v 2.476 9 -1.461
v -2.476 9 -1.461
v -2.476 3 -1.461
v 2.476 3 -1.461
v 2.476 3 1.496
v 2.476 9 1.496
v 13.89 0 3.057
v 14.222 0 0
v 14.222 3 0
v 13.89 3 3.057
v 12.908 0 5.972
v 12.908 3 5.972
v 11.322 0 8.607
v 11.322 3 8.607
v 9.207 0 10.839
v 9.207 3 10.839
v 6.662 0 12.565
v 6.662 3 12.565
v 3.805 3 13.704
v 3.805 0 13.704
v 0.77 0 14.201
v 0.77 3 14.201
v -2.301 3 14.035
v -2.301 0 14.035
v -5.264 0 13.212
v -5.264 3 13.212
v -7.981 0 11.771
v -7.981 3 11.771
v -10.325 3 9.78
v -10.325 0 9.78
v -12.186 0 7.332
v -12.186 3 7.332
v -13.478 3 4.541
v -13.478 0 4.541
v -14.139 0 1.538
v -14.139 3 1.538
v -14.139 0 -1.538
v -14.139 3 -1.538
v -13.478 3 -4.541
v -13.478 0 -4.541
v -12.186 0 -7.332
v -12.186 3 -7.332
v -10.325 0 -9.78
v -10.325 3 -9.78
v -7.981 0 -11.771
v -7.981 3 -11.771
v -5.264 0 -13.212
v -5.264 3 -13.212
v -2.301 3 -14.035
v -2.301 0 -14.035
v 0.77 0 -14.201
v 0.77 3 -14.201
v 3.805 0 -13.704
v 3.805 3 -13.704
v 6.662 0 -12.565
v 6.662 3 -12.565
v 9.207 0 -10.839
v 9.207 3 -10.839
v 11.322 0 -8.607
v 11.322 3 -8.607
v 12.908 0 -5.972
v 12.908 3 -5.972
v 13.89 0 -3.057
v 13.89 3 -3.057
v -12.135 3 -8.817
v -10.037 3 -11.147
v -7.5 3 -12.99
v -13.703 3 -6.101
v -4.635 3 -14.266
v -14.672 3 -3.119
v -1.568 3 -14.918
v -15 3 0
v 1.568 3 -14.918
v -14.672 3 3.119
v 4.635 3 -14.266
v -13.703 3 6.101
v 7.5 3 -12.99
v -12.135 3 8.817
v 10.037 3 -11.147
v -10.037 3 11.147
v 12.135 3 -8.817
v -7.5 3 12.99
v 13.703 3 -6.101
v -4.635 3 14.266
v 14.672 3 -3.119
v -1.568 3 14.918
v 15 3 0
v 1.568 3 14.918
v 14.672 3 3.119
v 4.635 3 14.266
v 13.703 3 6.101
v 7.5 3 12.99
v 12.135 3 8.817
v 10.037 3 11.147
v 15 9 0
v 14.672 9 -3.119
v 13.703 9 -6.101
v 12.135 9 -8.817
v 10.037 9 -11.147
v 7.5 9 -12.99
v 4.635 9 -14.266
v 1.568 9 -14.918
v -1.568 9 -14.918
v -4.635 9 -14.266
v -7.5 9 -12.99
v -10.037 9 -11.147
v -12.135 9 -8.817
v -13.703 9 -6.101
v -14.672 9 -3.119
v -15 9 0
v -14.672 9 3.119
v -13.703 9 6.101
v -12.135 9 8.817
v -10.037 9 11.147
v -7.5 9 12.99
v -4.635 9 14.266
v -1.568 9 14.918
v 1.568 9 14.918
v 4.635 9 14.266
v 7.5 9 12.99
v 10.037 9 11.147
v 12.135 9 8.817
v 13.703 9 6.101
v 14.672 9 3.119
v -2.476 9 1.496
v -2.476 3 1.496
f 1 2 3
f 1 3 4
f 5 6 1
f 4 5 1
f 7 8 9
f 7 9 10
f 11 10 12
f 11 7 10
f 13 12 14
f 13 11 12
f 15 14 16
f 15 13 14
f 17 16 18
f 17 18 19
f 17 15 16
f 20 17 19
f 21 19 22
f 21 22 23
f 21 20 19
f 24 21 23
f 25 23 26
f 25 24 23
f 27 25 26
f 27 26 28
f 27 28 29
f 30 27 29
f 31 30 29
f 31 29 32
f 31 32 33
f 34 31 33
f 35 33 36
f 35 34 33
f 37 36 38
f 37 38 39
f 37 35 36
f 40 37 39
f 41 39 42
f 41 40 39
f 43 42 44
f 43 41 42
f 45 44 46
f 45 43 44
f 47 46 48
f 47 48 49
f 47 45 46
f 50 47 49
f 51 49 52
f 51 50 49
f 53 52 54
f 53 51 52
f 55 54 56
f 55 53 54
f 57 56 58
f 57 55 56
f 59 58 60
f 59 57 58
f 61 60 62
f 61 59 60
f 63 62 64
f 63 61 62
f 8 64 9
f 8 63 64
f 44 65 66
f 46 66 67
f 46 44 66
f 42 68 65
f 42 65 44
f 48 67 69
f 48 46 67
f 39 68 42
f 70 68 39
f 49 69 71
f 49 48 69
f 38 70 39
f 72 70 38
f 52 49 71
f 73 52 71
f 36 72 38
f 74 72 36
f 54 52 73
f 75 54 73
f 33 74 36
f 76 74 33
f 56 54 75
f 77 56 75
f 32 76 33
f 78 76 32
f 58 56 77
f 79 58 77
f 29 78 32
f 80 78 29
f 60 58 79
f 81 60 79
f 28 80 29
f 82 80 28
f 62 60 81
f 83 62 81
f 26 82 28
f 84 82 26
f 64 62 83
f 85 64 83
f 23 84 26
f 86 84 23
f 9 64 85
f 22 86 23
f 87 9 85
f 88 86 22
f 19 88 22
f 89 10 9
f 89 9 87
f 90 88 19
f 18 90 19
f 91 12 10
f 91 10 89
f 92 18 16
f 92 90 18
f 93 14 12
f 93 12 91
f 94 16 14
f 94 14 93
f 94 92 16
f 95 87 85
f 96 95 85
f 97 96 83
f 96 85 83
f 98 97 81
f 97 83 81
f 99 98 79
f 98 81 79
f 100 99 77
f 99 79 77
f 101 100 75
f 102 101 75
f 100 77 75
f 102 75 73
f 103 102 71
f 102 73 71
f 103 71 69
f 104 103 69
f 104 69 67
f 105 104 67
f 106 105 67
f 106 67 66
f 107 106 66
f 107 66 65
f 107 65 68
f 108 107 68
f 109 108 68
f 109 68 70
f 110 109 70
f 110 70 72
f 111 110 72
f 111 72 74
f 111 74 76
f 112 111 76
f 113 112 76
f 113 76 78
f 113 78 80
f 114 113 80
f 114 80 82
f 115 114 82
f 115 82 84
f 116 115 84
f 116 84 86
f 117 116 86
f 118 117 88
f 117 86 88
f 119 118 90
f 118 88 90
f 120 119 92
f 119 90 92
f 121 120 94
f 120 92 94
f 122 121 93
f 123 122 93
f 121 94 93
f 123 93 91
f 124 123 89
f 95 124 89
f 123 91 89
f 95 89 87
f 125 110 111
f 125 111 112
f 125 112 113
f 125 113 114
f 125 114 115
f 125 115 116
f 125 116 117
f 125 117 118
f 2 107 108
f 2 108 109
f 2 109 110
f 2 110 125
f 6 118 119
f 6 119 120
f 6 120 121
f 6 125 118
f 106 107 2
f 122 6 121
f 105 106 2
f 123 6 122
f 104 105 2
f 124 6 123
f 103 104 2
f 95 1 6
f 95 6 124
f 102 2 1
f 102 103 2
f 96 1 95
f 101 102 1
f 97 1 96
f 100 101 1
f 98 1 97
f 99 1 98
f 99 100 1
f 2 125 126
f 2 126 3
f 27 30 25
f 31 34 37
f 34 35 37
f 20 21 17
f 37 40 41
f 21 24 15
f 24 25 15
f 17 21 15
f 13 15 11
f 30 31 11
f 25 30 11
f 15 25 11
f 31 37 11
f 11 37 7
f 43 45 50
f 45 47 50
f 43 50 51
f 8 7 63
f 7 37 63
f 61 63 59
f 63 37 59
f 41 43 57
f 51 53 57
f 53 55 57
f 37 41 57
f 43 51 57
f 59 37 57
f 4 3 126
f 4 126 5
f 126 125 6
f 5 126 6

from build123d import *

# Parameters (mm, degrees)
SKETCH1_R           = 15
BOSS_EXTRUDE1_DEPTH = 9
SKETCH6_OUTSIDE_W   = 40.674
SKETCH6_OUTSIDE_H   = 40.674
SKETCH6_OUTSIDE_R   = 14.222015383
CUT_EXTRUDE4_DEPTH  = 3
SKETCH8_W           = 4.952506836
SKETCH8_H           = 2.956951794
CUT_EXTRUDE5_DEPTH  = 6


with BuildPart() as part:
    # Sketch1 → Boss-Extrude1 (new body)
    with BuildSketch(Plane(origin=(0, 0, 0), x_dir=(1, 0, 0), z_dir=(0, 1, 0))):
        Circle(SKETCH1_R)
    extrude(amount=BOSS_EXTRUDE1_DEPTH)

    # Sketch6 outside → Cut-Extrude4 (cut)
    with BuildSketch(Plane.XZ):
        Rectangle(SKETCH6_OUTSIDE_W, SKETCH6_OUTSIDE_H)
        Circle(SKETCH6_OUTSIDE_R, mode=Mode.SUBTRACT)
    extrude(amount=-CUT_EXTRUDE4_DEPTH, mode=Mode.SUBTRACT)

    # Sketch8 → Cut-Extrude5 (cut)
    with BuildSketch(Plane(origin=(0, 9, 0), x_dir=(1, 0, 0), z_dir=(0, 1, 0))):
        with Locations((0, -0.017356659)):
            Rectangle(SKETCH8_W, SKETCH8_H)
    extrude(amount=-CUT_EXTRUDE5_DEPTH, mode=Mode.SUBTRACT)


solid = part.part
